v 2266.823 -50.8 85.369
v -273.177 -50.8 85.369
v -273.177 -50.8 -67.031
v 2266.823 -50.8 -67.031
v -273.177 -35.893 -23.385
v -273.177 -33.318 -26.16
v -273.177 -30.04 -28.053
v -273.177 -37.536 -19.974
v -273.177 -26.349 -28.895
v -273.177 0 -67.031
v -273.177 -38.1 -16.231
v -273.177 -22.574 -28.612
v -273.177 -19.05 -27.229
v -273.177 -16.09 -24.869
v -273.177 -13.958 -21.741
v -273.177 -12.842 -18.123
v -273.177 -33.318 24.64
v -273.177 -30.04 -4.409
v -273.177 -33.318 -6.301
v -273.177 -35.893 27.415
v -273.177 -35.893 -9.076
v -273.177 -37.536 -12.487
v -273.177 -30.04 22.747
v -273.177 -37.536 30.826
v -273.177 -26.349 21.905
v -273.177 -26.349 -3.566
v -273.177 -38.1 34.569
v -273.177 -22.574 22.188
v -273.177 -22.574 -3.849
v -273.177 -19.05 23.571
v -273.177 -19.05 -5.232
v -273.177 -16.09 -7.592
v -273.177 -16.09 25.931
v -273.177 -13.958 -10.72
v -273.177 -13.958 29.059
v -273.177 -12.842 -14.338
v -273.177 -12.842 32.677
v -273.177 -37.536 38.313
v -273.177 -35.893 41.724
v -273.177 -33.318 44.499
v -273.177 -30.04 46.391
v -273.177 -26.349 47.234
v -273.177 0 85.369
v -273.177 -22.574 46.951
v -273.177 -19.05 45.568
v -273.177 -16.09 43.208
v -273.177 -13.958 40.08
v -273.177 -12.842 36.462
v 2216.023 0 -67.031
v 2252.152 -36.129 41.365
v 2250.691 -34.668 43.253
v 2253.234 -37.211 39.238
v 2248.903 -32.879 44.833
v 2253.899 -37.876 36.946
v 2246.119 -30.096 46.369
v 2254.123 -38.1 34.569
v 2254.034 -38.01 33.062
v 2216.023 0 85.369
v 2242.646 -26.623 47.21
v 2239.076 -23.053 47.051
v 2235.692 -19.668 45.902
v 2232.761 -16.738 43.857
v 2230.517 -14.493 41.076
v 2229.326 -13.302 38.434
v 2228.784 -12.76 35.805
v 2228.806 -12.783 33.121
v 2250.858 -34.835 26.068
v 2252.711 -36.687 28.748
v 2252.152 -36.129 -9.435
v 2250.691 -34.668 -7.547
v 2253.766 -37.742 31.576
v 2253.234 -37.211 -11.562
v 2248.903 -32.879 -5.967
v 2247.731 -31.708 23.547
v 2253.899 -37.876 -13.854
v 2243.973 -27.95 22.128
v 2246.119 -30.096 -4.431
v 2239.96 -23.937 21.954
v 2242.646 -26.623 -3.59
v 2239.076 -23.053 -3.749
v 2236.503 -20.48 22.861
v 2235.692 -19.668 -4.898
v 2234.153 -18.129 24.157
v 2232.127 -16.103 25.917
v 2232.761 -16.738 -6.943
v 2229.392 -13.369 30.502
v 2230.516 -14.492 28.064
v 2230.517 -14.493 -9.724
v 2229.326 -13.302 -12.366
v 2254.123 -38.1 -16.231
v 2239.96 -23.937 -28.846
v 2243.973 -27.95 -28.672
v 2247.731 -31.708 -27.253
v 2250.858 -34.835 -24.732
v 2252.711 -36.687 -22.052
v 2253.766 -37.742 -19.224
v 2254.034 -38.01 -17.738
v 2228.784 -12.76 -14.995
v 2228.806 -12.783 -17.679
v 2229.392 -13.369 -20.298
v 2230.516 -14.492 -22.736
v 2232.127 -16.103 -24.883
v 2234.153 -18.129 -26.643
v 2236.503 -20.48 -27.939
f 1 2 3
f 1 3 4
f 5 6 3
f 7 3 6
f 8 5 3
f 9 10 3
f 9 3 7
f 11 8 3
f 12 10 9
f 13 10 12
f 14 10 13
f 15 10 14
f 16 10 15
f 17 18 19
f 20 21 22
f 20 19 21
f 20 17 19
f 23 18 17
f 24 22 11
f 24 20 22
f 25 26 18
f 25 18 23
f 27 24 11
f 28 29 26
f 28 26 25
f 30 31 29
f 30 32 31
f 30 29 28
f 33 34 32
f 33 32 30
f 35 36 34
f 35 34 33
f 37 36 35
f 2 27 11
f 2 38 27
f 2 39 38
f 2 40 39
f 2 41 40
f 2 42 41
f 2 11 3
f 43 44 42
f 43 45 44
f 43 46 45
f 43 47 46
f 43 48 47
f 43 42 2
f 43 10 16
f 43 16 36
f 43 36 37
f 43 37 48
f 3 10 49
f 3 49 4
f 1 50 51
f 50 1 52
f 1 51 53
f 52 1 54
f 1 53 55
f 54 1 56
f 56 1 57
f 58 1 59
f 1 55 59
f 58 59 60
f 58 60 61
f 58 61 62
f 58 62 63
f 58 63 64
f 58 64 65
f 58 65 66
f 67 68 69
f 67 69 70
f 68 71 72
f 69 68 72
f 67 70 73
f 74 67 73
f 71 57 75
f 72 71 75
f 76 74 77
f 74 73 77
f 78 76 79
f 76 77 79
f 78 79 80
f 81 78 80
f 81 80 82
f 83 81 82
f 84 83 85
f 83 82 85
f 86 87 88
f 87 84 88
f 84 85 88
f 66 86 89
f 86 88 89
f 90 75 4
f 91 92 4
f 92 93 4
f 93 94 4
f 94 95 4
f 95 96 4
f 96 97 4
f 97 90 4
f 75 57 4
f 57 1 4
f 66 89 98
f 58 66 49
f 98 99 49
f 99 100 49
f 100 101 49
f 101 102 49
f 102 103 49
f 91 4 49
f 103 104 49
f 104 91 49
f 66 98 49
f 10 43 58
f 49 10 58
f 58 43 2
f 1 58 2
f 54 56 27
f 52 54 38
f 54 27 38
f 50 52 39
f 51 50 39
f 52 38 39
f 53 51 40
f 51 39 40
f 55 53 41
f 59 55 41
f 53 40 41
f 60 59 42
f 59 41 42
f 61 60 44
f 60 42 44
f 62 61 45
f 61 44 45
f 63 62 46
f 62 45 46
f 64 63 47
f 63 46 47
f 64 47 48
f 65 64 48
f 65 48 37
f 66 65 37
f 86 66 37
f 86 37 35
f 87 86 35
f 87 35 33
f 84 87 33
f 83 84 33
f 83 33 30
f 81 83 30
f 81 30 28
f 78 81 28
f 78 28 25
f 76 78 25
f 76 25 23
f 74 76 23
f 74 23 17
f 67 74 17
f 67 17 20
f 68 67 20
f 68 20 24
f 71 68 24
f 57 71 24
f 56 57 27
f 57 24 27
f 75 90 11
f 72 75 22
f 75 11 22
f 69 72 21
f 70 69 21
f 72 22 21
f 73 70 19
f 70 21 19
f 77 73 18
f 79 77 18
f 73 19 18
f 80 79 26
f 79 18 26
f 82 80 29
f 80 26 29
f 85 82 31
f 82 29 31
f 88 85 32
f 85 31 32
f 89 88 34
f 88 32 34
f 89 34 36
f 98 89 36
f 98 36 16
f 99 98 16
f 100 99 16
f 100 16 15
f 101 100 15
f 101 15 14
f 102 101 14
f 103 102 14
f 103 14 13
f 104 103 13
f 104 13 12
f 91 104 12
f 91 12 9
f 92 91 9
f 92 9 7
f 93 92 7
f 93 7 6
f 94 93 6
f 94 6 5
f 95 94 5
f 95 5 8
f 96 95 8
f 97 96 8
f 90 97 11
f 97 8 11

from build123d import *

# Parameters (mm, degrees)
F0_W        = 2540
F0_H        = 152.4
F1_DEPTH    = 50.8
F2_R        = 12.7
F3_DEPTH    = 2540
F4_T1_DEPTH = 413.6829915773


# Not quite as in the source:
# - a fillet or chamfer that OpenCascade refuses, or shapes differently, is made with other operations: its cross-section is extruded or revolved along the edge and cut away or added


with BuildPart() as f1:
    # F0 (on Front) → F1 (new body)
    with BuildSketch(Plane.XZ):
        with Locations((996.8233792729, 9.1693531722)):
            Rectangle(F0_W, F0_H)
    extrude(amount=F1_DEPTH)

    # F2 (on face) → F3 (cut)
    with BuildSketch(Plane(origin=(-273.1766207271, 0, 0), x_dir=(0, -1, 0), z_dir=(-1, 0, 0))):
        with Locations((25.4, 34.5693531722)):
            Circle(F2_R)
        with Locations((25.4, -16.2306468278)):
            Circle(F2_R)
    extrude(amount=-F3_DEPTH, mode=Mode.SUBTRACT)

    # F4: chamfer of 50.8 on 1 edges, made by hand

    # F4_s2 → F4_t1 (cut)
    with BuildSketch(Plane.XY.offset(-197.6721426165)):
        Polygon((2266.8233792729, -50.8), (2216.0233792729, 0), (2266.8233792729, 0), align=None)
    extrude(amount=F4_T1_DEPTH, mode=Mode.SUBTRACT)


solid = f1.part
